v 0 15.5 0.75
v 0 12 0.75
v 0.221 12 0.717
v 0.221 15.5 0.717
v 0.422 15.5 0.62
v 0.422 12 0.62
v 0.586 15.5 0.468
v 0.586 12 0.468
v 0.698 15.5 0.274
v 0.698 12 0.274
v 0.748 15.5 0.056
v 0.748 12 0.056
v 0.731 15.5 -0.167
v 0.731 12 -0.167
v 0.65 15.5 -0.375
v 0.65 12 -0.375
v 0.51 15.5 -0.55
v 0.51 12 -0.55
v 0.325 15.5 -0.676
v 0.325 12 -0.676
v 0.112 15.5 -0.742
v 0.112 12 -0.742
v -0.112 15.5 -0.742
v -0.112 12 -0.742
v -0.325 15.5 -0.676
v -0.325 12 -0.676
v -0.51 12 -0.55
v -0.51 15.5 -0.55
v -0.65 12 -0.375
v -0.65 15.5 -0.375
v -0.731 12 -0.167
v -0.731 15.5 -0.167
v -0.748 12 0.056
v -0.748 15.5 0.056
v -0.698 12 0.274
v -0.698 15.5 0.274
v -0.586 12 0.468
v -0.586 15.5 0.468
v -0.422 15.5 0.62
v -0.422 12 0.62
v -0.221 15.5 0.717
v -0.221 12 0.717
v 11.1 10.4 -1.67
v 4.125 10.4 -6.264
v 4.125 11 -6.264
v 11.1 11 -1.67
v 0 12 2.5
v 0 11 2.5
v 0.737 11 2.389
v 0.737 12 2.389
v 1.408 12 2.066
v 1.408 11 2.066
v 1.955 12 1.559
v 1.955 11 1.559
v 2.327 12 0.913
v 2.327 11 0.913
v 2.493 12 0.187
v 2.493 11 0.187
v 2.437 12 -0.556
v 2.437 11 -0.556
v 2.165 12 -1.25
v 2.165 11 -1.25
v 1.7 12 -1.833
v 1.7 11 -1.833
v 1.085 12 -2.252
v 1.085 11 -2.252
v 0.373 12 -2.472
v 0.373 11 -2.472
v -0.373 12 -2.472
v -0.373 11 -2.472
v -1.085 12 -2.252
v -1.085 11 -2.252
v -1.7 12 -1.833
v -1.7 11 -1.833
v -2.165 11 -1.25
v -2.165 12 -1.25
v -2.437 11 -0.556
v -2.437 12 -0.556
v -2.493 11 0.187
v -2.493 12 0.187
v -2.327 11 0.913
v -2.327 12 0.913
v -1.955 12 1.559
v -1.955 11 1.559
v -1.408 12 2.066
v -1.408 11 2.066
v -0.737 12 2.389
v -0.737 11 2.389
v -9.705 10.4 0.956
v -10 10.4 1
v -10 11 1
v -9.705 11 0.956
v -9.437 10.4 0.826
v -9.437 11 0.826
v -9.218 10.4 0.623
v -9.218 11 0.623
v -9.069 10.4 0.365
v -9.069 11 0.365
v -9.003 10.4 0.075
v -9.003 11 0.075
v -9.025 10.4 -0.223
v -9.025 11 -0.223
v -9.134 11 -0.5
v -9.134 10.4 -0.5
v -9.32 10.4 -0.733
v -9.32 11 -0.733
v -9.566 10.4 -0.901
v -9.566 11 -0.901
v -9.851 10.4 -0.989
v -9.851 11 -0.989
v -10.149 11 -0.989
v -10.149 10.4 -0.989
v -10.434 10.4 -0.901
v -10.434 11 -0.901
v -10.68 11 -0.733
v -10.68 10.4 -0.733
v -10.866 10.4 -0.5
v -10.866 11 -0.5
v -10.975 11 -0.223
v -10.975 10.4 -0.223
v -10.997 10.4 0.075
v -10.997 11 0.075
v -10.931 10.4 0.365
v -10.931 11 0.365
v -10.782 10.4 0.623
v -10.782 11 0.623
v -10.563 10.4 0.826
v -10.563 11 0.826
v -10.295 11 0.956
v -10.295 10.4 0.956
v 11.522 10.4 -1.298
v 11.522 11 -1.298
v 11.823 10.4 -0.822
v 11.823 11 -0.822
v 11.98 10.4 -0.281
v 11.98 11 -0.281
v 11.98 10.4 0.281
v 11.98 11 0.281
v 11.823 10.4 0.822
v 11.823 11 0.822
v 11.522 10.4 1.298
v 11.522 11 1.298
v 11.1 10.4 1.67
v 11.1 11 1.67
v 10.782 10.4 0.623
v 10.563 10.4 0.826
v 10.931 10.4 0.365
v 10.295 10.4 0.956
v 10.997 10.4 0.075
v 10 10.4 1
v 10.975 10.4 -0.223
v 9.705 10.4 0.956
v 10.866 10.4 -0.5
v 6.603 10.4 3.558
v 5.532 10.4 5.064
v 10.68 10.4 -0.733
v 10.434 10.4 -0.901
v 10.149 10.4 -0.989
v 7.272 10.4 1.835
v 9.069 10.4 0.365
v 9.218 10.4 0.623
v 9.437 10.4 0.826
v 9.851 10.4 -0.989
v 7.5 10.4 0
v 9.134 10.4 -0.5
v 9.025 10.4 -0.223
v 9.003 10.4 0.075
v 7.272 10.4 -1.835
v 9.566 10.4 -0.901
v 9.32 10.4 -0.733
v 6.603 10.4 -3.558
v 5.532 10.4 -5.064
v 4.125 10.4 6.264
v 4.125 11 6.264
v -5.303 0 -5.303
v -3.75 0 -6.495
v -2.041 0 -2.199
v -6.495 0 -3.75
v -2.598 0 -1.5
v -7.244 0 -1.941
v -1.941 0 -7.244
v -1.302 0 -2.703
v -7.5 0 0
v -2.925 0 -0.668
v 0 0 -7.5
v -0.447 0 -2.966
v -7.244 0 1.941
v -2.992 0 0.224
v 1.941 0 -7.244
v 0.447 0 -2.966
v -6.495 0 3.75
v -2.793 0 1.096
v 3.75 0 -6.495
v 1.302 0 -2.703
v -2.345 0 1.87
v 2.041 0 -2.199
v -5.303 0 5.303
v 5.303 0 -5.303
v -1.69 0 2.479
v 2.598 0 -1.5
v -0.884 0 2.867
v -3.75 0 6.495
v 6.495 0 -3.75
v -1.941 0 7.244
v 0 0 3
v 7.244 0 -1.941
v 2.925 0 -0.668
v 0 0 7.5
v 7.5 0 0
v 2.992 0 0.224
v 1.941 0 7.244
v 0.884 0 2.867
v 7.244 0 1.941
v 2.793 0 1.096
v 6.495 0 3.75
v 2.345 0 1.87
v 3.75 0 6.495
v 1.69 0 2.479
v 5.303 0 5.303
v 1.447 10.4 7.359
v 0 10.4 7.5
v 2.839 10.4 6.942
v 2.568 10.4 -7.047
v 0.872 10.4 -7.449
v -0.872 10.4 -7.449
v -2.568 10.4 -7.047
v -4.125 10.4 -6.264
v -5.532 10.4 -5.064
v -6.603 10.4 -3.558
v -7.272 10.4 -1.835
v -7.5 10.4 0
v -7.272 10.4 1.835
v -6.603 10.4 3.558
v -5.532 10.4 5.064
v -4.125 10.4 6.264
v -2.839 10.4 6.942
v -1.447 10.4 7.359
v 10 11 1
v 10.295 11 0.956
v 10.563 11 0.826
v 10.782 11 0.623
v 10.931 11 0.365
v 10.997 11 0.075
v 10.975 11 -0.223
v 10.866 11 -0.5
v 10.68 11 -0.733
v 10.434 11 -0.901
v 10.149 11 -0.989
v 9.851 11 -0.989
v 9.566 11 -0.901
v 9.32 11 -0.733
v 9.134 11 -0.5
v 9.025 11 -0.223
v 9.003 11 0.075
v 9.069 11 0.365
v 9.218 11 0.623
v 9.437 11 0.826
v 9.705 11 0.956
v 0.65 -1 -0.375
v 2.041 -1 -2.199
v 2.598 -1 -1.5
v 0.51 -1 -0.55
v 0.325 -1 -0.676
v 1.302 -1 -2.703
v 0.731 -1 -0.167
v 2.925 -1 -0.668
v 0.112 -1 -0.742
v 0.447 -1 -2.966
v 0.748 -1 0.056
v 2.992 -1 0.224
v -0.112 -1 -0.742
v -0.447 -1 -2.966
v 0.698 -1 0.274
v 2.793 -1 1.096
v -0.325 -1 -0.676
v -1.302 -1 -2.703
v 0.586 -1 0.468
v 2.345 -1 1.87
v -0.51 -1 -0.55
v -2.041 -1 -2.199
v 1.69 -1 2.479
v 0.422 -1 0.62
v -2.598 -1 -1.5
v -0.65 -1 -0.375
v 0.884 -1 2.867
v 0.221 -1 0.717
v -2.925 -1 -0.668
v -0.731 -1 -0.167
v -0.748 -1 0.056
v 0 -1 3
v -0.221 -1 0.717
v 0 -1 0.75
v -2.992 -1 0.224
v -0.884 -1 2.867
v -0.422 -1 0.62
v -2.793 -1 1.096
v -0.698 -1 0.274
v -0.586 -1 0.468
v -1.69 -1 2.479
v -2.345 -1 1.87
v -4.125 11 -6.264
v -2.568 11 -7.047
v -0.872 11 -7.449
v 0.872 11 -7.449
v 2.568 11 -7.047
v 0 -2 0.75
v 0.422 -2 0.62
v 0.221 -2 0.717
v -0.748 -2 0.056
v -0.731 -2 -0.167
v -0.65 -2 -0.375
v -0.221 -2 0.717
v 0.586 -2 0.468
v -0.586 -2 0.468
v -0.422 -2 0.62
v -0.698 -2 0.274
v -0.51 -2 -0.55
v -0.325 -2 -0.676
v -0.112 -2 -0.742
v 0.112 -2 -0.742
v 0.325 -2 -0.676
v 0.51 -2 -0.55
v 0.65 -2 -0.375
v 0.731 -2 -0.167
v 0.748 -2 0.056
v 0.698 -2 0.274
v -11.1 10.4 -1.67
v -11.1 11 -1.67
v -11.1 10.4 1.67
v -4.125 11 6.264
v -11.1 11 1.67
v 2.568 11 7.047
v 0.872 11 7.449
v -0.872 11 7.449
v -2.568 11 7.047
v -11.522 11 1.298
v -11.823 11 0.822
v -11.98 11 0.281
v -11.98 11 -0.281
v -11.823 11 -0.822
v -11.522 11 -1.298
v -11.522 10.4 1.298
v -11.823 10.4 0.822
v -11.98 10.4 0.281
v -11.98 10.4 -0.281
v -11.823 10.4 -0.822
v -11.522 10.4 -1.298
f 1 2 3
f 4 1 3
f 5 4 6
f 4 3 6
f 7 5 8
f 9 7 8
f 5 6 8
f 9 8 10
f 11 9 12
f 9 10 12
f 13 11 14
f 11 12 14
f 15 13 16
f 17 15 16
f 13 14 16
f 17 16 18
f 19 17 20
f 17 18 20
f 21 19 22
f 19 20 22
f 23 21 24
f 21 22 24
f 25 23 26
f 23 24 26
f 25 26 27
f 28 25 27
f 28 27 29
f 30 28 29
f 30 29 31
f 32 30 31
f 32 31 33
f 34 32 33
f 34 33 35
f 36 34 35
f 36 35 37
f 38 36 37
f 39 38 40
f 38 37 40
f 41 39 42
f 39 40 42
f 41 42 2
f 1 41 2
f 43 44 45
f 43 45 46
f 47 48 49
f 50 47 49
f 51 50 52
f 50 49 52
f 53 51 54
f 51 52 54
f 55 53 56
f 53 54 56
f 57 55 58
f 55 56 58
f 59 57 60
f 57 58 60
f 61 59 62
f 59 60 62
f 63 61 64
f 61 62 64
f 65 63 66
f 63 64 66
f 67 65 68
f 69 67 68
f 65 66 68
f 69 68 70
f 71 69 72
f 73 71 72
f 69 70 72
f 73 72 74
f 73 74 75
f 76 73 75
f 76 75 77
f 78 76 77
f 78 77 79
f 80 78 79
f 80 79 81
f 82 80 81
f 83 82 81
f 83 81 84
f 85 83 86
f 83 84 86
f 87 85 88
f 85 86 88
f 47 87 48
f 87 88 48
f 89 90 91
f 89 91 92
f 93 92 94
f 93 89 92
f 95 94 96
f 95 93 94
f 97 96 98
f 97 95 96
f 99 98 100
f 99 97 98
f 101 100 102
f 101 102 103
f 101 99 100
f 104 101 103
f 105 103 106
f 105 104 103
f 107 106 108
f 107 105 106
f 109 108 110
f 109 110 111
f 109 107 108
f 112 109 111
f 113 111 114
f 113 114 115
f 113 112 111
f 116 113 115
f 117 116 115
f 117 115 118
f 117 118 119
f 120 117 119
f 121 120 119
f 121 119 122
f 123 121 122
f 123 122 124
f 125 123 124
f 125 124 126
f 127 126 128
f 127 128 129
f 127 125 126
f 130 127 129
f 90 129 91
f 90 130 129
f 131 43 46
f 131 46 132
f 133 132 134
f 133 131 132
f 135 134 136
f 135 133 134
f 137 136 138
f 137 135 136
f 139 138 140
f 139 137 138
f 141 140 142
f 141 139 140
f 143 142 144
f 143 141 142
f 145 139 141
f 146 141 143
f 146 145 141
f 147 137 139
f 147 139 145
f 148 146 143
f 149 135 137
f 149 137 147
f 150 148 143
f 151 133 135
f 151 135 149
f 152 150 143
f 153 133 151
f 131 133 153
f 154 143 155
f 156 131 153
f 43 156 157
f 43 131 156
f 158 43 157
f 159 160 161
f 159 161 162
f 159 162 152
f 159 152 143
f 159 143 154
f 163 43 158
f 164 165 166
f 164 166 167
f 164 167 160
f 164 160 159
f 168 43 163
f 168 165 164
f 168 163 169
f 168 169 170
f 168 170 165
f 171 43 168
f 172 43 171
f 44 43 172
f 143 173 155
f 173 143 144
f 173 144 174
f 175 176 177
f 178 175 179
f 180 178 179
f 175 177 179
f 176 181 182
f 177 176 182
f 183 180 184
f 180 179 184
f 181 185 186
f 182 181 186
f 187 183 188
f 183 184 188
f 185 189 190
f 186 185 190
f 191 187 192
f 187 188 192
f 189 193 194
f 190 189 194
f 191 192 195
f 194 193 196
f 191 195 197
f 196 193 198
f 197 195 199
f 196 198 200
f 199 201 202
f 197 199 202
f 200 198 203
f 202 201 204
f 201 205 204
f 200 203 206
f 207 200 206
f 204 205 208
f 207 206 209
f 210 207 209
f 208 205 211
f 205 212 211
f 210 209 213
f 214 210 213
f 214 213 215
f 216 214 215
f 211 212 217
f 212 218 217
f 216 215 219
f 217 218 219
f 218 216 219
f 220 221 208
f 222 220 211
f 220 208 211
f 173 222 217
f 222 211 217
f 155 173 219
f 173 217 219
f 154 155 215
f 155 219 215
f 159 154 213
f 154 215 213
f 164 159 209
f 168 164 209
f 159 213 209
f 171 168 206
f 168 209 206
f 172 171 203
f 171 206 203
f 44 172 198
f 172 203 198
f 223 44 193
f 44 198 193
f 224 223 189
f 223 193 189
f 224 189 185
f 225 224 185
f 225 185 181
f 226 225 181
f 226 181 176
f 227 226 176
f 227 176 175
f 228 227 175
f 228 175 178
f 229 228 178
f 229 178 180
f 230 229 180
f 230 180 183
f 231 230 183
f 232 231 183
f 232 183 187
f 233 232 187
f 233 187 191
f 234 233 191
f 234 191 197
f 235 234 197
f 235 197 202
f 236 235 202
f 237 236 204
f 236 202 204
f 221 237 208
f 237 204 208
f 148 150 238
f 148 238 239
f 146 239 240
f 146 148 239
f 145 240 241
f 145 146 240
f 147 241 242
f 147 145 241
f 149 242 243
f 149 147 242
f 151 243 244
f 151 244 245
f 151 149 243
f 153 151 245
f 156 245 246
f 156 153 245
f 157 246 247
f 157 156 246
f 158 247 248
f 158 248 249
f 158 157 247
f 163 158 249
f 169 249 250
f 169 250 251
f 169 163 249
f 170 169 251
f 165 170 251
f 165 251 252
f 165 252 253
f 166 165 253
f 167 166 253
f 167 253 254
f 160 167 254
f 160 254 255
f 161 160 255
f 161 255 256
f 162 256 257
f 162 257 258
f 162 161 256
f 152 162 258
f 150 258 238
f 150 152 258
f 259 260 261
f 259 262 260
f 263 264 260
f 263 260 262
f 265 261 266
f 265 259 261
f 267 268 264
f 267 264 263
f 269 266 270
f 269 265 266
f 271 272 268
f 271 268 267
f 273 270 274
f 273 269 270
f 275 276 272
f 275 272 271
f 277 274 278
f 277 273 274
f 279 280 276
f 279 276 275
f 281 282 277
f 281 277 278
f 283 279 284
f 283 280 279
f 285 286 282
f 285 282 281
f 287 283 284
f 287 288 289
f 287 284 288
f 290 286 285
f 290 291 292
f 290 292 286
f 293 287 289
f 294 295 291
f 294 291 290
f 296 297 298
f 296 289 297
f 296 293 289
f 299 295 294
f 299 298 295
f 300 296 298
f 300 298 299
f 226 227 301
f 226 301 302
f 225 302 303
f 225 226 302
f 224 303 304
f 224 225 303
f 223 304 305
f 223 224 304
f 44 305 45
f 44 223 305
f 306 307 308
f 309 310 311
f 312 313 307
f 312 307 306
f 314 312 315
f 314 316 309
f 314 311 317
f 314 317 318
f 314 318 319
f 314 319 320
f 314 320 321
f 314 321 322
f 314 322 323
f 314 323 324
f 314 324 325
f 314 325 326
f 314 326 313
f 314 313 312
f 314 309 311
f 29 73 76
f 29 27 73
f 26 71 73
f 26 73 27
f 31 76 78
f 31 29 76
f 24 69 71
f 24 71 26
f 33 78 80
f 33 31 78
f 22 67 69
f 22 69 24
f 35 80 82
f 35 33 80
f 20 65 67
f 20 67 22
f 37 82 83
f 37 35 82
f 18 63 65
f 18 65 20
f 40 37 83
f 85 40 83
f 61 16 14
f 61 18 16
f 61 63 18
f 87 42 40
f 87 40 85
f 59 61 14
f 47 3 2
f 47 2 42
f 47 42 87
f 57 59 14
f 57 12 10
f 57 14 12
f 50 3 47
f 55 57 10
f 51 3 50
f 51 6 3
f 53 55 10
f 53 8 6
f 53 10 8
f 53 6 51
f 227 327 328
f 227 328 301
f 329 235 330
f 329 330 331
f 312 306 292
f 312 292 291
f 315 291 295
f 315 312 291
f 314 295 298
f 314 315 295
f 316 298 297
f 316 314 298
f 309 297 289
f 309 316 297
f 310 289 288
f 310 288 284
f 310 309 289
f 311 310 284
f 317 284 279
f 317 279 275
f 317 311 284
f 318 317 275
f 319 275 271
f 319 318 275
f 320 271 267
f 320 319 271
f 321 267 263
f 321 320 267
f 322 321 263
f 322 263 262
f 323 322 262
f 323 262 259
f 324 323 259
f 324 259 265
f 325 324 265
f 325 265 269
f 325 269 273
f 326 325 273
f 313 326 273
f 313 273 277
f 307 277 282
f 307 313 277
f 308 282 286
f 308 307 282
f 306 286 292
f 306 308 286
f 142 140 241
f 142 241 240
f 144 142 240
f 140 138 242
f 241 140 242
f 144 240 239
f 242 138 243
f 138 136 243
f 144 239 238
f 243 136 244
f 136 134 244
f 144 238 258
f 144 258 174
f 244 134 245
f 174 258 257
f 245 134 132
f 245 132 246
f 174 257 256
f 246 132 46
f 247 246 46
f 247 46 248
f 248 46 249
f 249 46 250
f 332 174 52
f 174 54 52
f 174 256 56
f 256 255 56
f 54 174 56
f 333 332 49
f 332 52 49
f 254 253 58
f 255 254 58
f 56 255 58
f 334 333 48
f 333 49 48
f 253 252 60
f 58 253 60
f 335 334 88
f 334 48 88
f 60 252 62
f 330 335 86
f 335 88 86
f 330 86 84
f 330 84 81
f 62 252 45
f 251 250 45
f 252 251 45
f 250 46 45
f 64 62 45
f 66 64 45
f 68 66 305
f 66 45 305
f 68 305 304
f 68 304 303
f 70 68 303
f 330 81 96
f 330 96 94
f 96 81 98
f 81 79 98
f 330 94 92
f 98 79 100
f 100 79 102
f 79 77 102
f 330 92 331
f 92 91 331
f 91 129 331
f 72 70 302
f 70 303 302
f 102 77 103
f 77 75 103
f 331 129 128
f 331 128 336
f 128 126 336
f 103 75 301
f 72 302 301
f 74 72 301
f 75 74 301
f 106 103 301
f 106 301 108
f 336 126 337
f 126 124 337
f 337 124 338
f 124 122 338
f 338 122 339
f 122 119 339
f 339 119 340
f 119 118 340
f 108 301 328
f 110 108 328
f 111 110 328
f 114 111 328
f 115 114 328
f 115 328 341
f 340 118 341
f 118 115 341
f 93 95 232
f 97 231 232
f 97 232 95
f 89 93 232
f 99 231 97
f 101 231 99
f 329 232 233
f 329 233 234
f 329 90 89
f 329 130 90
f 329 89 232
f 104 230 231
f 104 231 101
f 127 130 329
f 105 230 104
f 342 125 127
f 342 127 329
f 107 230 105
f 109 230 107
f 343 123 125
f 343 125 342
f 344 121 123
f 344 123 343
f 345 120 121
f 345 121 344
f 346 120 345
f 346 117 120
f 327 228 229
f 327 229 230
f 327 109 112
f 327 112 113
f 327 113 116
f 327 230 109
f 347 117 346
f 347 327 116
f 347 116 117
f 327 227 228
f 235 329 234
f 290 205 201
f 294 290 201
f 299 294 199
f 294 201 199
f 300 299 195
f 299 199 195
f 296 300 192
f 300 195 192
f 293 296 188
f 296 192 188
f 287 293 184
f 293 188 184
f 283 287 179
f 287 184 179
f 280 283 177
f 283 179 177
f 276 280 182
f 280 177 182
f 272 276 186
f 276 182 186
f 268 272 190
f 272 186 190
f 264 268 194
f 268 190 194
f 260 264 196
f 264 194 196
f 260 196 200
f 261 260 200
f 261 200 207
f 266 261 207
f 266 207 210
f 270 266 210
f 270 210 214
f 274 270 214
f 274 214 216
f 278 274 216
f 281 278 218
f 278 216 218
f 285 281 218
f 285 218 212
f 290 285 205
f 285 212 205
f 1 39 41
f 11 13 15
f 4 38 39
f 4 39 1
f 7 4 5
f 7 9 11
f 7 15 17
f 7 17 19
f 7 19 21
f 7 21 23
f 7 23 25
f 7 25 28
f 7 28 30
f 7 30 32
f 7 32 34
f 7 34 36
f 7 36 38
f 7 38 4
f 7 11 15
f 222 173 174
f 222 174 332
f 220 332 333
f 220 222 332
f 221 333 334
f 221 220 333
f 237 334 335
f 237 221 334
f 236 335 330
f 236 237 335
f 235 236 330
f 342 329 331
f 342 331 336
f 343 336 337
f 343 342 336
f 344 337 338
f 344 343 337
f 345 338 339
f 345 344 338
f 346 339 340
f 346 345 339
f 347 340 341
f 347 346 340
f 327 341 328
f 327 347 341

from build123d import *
from build123d.topology import SkipClean

# Parameters (mm, degrees)
SKETCH1_R           = 7.5
BOSS_EXTRUDE1_DEPTH = 10.4
SKETCH2_R           = 3
BOSS_EXTRUDE2_DEPTH = 1
SKETCH3_R           = 1
BOSS_EXTRUDE3_DEPTH = 0.6
SKETCH4_R           = 2.5
BOSS_EXTRUDE4_DEPTH = 1
SKETCH5_R           = 0.75
BOSS_EXTRUDE5_DEPTH = 3.5
BOSS_EXTRUDE6_START = 1
SKETCH6_R           = 0.75
BOSS_EXTRUDE6_DEPTH = 1


with BuildPart() as part:
    # Sketch1 → Boss-Extrude1 (new body)
    with BuildSketch(Plane(origin=(0, 0, 0), x_dir=(1, 0, 0), z_dir=(0, 1, 0))):
        with Locations(Location((0, 0, 0), (0, 0, 270))):
            Circle(SKETCH1_R)
    extrude(amount=BOSS_EXTRUDE1_DEPTH)

    # Sketch2 → Boss-Extrude2 (add)
    with BuildSketch(Plane.XZ):
        with Locations(Location((0, 0, 0), (0, 0, 90))):
            Circle(SKETCH2_R)
    extrude(amount=BOSS_EXTRUDE2_DEPTH)

    # Sketch3 → Boss-Extrude3 (add)
    with SkipClean():  # the faces are left unmerged after this step: merging them gives an invalid solid
        with BuildSketch(Plane(origin=(0, 10.4, 0), x_dir=(1, 0, 0), z_dir=(0, 1, 0))):
            with BuildLine():
                Line((-11.1, 1.670329309), (-4.125, 6.263734908))
                ThreePointArc((-4.125, 6.263734908), (0, 7.5), (4.125, 6.263734908))
                Line((4.125, 6.263734908), (11.1, 1.670329309))
                ThreePointArc((11.1, 1.670329309), (12, 0), (11.1, -1.670329309))
                Line((11.1, -1.670329309), (4.125, -6.263734908))
                ThreePointArc((4.125, -6.263734908), (0, -7.5), (-4.125, -6.263734908))
                Line((-4.125, -6.263734908), (-11.1, -1.670329309))
                ThreePointArc((-11.1, -1.670329309), (-12, 0), (-11.1, 1.670329309))
            make_face()
            with Locations(Location((-10, 0, 0), (0, 0, 270))):
                Circle(SKETCH3_R, mode=Mode.SUBTRACT)
            with Locations(Location((10, 0, 0), (0, 0, 270))):
                Circle(SKETCH3_R, mode=Mode.SUBTRACT)
        extrude(amount=BOSS_EXTRUDE3_DEPTH)

    # Sketch4 → Boss-Extrude4 (add)
    with SkipClean():  # the faces are left unmerged after this step: merging them gives an invalid solid
        with BuildSketch(Plane(origin=(0, 11, 0), x_dir=(1, 0, 0), z_dir=(0, 1, 0))):
            with Locations(Location((0, 0, 0), (0, 0, 270))):
                Circle(SKETCH4_R)
        extrude(amount=BOSS_EXTRUDE4_DEPTH)

    # Sketch5 → Boss-Extrude5 (add)
    with SkipClean():  # the faces are left unmerged after this step: merging them gives an invalid solid
        with BuildSketch(Plane(origin=(0, 12, 0), x_dir=(1, 0, 0), z_dir=(0, 1, 0))):
            with Locations(Location((0, 0, 0), (0, 0, 270))):
                Circle(SKETCH5_R)
        extrude(amount=BOSS_EXTRUDE5_DEPTH)

    # Sketch6 → Boss-Extrude6 (add)
    with SkipClean():  # the faces are left unmerged after this step: merging them gives an invalid solid
        with BuildSketch(Plane.XZ.offset(1).offset(BOSS_EXTRUDE6_START)):
            with Locations(Location((0, 0, 0), (0, 0, 90))):
                Circle(SKETCH6_R)
        extrude(amount=-BOSS_EXTRUDE6_DEPTH)


solid = part.part
